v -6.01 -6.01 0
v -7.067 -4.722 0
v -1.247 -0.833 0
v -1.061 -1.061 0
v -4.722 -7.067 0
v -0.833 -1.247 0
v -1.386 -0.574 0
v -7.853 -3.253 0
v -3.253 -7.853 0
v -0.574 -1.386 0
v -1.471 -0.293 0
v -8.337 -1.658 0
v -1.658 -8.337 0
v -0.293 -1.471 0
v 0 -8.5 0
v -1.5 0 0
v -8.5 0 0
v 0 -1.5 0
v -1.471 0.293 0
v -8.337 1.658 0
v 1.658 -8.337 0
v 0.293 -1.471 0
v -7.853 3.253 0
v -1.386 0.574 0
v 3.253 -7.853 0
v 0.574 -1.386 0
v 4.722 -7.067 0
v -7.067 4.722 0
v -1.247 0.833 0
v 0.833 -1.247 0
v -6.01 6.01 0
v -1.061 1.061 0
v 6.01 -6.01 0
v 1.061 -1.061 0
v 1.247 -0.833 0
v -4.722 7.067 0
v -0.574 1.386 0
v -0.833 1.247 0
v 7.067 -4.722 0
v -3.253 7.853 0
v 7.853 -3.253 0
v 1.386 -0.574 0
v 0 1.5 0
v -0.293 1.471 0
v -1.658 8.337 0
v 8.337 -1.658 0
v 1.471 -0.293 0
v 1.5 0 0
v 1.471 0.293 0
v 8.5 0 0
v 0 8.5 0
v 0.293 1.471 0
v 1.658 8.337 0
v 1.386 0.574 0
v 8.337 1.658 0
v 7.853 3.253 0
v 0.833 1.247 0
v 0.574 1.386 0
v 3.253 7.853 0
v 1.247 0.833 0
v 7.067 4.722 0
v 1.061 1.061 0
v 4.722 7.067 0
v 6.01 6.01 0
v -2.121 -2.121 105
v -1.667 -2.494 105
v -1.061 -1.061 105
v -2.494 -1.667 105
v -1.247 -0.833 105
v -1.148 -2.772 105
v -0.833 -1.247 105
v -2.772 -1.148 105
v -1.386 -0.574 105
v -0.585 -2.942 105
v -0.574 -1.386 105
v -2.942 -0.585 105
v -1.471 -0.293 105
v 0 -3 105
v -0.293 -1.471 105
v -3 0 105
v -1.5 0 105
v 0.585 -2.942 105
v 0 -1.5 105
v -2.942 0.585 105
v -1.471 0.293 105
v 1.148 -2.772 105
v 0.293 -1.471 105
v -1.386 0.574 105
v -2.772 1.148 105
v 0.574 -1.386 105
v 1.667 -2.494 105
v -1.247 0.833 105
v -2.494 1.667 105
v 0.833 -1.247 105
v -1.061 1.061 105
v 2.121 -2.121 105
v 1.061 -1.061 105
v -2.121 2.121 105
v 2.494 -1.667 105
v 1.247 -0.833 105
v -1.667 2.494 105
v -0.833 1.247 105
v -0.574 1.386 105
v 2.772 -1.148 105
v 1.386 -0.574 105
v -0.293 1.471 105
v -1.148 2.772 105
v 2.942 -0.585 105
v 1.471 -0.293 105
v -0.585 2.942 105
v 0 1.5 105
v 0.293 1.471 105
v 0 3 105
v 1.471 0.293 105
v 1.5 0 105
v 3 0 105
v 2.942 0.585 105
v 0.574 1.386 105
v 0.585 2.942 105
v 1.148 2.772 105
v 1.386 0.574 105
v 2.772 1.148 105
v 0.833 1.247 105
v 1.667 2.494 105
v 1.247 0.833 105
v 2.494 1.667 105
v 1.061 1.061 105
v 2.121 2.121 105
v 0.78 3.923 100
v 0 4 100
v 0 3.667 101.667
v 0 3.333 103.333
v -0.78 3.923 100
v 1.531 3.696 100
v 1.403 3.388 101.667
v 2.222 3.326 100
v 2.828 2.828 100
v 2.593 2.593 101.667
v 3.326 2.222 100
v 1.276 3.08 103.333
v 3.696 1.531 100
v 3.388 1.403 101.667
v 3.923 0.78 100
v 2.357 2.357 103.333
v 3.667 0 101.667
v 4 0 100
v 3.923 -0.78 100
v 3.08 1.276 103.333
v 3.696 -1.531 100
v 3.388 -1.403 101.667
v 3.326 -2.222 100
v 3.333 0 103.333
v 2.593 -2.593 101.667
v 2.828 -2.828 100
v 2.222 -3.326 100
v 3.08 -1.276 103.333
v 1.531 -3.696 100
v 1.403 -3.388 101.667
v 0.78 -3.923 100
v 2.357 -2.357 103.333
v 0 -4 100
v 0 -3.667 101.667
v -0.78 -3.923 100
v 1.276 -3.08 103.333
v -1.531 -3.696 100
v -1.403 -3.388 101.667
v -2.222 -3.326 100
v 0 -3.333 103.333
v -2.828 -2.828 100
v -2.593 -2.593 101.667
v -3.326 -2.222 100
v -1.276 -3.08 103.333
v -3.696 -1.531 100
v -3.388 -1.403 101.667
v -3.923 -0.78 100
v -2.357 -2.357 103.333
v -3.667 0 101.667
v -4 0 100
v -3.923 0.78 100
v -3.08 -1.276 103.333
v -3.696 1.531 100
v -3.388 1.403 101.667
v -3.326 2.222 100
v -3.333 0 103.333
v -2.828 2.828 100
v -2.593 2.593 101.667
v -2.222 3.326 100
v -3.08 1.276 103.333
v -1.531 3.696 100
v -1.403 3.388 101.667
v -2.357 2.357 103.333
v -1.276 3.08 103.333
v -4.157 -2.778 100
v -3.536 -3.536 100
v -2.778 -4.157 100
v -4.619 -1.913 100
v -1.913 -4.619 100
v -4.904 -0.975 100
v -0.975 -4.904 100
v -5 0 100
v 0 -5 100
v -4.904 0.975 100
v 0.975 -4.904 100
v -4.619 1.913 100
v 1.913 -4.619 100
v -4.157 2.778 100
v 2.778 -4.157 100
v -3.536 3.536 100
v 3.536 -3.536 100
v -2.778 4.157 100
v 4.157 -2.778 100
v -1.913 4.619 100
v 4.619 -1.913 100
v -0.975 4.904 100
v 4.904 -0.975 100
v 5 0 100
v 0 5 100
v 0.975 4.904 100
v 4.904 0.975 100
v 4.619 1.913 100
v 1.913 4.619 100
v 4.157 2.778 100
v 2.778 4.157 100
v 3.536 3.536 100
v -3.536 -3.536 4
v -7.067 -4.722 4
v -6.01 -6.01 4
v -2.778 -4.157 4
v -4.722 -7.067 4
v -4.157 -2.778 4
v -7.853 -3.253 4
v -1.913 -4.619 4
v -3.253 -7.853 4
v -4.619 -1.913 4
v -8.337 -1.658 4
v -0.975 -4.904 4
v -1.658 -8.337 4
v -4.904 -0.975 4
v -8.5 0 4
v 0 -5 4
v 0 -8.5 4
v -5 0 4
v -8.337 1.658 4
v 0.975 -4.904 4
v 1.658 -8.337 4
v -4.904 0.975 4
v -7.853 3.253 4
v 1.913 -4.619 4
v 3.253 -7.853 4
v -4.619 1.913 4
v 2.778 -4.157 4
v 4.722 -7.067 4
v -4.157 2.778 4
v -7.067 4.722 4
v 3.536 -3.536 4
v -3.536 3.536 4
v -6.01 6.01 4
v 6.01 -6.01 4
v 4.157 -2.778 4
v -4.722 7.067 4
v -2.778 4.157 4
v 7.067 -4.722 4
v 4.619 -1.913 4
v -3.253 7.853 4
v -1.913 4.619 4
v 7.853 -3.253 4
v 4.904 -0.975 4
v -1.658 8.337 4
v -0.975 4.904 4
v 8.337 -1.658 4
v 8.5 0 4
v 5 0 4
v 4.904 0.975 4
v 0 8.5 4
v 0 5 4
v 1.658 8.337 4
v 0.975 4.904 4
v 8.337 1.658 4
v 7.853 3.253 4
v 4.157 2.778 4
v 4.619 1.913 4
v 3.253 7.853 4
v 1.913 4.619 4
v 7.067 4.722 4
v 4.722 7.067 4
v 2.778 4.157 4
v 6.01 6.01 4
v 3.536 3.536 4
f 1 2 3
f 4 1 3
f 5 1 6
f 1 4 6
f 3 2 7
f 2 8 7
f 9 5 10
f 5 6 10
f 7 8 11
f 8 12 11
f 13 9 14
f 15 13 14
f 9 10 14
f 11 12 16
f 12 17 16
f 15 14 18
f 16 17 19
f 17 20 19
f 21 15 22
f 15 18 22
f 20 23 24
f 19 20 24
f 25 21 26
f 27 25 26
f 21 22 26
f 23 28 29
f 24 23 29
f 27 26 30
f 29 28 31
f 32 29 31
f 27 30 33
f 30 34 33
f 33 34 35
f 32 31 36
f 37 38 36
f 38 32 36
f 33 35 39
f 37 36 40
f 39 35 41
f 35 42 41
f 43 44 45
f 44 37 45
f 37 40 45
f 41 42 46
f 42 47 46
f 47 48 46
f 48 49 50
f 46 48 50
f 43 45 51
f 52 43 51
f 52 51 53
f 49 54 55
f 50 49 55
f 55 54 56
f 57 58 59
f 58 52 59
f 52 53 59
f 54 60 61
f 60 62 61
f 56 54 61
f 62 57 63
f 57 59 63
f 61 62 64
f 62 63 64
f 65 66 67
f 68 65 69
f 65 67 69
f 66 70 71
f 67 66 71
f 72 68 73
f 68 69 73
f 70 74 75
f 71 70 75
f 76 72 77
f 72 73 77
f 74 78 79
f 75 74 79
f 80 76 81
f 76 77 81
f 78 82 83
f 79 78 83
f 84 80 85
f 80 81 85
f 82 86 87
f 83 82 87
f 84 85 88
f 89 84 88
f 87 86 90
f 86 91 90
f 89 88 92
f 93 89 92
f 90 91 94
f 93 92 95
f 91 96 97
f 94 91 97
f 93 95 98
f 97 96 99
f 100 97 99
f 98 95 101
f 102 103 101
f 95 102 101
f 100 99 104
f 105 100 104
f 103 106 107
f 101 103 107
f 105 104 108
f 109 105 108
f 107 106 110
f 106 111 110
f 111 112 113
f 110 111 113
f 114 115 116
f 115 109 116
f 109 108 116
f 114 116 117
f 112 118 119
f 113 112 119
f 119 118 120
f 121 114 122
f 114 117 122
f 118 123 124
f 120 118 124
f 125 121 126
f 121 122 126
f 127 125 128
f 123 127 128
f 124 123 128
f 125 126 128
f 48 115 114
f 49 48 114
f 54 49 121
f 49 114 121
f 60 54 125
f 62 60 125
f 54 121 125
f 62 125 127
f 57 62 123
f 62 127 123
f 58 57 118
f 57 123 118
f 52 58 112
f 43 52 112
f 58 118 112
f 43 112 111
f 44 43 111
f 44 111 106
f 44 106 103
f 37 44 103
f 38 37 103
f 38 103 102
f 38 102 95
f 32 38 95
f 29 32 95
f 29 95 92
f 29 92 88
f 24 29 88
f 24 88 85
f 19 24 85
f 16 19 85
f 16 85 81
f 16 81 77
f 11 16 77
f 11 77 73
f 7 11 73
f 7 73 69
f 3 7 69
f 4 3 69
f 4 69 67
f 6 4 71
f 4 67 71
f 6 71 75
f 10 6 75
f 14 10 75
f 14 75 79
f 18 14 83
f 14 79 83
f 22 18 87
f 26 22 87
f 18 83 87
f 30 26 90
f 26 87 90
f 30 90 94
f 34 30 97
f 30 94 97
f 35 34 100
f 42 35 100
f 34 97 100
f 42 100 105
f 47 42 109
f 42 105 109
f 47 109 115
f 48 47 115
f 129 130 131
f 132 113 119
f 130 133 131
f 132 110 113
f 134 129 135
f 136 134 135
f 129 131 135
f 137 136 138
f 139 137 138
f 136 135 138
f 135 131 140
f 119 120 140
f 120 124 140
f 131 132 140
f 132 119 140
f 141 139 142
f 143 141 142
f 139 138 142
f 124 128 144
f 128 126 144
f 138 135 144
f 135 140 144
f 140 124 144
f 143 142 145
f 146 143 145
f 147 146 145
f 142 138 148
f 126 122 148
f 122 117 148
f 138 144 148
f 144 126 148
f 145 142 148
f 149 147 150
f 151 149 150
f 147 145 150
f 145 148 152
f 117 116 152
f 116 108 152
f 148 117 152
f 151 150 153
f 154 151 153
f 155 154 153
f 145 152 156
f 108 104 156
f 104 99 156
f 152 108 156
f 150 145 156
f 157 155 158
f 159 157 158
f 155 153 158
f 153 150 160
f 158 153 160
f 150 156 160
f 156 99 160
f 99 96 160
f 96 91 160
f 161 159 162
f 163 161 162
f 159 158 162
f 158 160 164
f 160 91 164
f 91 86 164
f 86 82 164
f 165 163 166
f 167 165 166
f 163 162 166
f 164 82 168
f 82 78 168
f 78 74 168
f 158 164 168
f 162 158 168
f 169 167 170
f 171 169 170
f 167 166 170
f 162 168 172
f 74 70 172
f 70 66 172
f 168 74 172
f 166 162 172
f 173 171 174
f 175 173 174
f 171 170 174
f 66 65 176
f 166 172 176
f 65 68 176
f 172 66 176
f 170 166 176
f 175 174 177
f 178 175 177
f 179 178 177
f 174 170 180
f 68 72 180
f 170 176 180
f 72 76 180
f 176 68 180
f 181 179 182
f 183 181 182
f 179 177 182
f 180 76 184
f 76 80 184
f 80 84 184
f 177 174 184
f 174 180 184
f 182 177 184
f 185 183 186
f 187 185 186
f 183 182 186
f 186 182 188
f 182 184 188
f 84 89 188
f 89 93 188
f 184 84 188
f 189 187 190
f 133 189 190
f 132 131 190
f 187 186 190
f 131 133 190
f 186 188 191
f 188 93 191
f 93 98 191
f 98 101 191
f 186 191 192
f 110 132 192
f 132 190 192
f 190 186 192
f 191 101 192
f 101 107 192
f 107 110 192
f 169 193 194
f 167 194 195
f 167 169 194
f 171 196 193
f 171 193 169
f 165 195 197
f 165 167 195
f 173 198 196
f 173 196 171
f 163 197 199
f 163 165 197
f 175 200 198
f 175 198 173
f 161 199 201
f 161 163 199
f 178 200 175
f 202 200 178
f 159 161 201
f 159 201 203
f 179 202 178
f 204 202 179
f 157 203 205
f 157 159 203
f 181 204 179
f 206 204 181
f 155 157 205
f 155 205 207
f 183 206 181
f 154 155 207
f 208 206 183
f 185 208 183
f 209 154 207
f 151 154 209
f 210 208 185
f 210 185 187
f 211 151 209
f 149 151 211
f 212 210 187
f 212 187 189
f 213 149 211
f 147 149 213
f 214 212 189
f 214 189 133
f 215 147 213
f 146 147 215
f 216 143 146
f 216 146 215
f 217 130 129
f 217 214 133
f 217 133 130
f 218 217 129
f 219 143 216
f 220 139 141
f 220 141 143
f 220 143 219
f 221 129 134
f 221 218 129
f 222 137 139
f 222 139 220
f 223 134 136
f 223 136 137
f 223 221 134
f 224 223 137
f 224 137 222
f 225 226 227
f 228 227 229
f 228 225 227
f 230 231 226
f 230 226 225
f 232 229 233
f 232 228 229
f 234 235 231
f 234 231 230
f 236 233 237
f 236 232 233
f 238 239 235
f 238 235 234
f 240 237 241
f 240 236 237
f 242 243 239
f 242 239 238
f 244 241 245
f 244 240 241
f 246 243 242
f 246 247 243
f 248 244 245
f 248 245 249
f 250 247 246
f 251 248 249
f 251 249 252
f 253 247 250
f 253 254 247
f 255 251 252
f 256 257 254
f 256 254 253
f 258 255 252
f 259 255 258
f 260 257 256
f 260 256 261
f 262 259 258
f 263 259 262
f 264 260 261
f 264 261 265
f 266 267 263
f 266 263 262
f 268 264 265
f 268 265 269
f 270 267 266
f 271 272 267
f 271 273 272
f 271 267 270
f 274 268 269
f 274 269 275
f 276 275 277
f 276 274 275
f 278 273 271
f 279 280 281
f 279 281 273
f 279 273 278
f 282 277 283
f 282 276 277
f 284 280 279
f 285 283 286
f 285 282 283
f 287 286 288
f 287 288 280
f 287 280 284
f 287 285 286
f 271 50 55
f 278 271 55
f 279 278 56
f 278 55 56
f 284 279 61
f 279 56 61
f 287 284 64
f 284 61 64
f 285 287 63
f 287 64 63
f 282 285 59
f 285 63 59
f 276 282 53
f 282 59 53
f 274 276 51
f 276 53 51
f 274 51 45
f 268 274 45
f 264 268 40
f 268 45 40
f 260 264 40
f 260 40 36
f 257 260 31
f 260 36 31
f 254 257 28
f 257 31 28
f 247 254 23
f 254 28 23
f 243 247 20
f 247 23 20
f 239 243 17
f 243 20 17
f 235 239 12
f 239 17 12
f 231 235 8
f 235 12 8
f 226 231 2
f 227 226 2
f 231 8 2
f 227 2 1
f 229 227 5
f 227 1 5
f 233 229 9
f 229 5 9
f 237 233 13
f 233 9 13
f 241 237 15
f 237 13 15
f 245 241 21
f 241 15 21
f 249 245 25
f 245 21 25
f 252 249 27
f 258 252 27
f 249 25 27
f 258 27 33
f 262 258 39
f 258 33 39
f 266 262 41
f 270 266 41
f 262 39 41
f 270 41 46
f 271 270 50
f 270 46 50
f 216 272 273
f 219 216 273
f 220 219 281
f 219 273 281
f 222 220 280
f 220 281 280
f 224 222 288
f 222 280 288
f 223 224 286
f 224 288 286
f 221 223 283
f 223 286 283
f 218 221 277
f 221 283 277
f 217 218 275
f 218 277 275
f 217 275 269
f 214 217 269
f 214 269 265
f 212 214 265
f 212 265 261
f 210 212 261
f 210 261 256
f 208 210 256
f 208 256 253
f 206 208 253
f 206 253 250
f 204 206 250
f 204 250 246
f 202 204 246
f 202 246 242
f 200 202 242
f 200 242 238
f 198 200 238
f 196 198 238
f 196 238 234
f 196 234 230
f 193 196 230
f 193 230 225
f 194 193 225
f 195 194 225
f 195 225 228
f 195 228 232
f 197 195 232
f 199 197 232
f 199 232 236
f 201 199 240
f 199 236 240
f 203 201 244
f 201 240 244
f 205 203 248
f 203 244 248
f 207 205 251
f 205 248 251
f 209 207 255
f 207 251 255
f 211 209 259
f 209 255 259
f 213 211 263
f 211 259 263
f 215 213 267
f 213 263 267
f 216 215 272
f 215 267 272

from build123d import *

# Parameters (mm, degrees)
F0_R     = 8.5
F1_DEPTH = 4
F2_R     = 5
F3_DEPTH = 100
F6_R     = 1.5
F7_DEPTH = 123


with BuildPart() as f1:
    # F0 (on Top) → F1 (new body)
    with BuildSketch(Plane.XY):
        Circle(F0_R)
    extrude(amount=F1_DEPTH)

    # F2 (on Top) → F3 (join)
    with BuildSketch(Plane.XY):
        Circle(F2_R)
    extrude(amount=F3_DEPTH)

    # F4 (on Right) → F5 (revolve)
    with BuildSketch(Plane.YZ):
        Polygon((3, 105), (0, 105), (0, 100), (4, 100), align=None)
    revolve(axis=Axis((0, 0, 102.5), (0, 0, -1)))

    # F6 (on face) → F7 (cut)
    with BuildSketch(Plane.XY.offset(105)):
        Circle(F6_R)
    extrude(amount=-F7_DEPTH, mode=Mode.SUBTRACT)


solid = f1.part
